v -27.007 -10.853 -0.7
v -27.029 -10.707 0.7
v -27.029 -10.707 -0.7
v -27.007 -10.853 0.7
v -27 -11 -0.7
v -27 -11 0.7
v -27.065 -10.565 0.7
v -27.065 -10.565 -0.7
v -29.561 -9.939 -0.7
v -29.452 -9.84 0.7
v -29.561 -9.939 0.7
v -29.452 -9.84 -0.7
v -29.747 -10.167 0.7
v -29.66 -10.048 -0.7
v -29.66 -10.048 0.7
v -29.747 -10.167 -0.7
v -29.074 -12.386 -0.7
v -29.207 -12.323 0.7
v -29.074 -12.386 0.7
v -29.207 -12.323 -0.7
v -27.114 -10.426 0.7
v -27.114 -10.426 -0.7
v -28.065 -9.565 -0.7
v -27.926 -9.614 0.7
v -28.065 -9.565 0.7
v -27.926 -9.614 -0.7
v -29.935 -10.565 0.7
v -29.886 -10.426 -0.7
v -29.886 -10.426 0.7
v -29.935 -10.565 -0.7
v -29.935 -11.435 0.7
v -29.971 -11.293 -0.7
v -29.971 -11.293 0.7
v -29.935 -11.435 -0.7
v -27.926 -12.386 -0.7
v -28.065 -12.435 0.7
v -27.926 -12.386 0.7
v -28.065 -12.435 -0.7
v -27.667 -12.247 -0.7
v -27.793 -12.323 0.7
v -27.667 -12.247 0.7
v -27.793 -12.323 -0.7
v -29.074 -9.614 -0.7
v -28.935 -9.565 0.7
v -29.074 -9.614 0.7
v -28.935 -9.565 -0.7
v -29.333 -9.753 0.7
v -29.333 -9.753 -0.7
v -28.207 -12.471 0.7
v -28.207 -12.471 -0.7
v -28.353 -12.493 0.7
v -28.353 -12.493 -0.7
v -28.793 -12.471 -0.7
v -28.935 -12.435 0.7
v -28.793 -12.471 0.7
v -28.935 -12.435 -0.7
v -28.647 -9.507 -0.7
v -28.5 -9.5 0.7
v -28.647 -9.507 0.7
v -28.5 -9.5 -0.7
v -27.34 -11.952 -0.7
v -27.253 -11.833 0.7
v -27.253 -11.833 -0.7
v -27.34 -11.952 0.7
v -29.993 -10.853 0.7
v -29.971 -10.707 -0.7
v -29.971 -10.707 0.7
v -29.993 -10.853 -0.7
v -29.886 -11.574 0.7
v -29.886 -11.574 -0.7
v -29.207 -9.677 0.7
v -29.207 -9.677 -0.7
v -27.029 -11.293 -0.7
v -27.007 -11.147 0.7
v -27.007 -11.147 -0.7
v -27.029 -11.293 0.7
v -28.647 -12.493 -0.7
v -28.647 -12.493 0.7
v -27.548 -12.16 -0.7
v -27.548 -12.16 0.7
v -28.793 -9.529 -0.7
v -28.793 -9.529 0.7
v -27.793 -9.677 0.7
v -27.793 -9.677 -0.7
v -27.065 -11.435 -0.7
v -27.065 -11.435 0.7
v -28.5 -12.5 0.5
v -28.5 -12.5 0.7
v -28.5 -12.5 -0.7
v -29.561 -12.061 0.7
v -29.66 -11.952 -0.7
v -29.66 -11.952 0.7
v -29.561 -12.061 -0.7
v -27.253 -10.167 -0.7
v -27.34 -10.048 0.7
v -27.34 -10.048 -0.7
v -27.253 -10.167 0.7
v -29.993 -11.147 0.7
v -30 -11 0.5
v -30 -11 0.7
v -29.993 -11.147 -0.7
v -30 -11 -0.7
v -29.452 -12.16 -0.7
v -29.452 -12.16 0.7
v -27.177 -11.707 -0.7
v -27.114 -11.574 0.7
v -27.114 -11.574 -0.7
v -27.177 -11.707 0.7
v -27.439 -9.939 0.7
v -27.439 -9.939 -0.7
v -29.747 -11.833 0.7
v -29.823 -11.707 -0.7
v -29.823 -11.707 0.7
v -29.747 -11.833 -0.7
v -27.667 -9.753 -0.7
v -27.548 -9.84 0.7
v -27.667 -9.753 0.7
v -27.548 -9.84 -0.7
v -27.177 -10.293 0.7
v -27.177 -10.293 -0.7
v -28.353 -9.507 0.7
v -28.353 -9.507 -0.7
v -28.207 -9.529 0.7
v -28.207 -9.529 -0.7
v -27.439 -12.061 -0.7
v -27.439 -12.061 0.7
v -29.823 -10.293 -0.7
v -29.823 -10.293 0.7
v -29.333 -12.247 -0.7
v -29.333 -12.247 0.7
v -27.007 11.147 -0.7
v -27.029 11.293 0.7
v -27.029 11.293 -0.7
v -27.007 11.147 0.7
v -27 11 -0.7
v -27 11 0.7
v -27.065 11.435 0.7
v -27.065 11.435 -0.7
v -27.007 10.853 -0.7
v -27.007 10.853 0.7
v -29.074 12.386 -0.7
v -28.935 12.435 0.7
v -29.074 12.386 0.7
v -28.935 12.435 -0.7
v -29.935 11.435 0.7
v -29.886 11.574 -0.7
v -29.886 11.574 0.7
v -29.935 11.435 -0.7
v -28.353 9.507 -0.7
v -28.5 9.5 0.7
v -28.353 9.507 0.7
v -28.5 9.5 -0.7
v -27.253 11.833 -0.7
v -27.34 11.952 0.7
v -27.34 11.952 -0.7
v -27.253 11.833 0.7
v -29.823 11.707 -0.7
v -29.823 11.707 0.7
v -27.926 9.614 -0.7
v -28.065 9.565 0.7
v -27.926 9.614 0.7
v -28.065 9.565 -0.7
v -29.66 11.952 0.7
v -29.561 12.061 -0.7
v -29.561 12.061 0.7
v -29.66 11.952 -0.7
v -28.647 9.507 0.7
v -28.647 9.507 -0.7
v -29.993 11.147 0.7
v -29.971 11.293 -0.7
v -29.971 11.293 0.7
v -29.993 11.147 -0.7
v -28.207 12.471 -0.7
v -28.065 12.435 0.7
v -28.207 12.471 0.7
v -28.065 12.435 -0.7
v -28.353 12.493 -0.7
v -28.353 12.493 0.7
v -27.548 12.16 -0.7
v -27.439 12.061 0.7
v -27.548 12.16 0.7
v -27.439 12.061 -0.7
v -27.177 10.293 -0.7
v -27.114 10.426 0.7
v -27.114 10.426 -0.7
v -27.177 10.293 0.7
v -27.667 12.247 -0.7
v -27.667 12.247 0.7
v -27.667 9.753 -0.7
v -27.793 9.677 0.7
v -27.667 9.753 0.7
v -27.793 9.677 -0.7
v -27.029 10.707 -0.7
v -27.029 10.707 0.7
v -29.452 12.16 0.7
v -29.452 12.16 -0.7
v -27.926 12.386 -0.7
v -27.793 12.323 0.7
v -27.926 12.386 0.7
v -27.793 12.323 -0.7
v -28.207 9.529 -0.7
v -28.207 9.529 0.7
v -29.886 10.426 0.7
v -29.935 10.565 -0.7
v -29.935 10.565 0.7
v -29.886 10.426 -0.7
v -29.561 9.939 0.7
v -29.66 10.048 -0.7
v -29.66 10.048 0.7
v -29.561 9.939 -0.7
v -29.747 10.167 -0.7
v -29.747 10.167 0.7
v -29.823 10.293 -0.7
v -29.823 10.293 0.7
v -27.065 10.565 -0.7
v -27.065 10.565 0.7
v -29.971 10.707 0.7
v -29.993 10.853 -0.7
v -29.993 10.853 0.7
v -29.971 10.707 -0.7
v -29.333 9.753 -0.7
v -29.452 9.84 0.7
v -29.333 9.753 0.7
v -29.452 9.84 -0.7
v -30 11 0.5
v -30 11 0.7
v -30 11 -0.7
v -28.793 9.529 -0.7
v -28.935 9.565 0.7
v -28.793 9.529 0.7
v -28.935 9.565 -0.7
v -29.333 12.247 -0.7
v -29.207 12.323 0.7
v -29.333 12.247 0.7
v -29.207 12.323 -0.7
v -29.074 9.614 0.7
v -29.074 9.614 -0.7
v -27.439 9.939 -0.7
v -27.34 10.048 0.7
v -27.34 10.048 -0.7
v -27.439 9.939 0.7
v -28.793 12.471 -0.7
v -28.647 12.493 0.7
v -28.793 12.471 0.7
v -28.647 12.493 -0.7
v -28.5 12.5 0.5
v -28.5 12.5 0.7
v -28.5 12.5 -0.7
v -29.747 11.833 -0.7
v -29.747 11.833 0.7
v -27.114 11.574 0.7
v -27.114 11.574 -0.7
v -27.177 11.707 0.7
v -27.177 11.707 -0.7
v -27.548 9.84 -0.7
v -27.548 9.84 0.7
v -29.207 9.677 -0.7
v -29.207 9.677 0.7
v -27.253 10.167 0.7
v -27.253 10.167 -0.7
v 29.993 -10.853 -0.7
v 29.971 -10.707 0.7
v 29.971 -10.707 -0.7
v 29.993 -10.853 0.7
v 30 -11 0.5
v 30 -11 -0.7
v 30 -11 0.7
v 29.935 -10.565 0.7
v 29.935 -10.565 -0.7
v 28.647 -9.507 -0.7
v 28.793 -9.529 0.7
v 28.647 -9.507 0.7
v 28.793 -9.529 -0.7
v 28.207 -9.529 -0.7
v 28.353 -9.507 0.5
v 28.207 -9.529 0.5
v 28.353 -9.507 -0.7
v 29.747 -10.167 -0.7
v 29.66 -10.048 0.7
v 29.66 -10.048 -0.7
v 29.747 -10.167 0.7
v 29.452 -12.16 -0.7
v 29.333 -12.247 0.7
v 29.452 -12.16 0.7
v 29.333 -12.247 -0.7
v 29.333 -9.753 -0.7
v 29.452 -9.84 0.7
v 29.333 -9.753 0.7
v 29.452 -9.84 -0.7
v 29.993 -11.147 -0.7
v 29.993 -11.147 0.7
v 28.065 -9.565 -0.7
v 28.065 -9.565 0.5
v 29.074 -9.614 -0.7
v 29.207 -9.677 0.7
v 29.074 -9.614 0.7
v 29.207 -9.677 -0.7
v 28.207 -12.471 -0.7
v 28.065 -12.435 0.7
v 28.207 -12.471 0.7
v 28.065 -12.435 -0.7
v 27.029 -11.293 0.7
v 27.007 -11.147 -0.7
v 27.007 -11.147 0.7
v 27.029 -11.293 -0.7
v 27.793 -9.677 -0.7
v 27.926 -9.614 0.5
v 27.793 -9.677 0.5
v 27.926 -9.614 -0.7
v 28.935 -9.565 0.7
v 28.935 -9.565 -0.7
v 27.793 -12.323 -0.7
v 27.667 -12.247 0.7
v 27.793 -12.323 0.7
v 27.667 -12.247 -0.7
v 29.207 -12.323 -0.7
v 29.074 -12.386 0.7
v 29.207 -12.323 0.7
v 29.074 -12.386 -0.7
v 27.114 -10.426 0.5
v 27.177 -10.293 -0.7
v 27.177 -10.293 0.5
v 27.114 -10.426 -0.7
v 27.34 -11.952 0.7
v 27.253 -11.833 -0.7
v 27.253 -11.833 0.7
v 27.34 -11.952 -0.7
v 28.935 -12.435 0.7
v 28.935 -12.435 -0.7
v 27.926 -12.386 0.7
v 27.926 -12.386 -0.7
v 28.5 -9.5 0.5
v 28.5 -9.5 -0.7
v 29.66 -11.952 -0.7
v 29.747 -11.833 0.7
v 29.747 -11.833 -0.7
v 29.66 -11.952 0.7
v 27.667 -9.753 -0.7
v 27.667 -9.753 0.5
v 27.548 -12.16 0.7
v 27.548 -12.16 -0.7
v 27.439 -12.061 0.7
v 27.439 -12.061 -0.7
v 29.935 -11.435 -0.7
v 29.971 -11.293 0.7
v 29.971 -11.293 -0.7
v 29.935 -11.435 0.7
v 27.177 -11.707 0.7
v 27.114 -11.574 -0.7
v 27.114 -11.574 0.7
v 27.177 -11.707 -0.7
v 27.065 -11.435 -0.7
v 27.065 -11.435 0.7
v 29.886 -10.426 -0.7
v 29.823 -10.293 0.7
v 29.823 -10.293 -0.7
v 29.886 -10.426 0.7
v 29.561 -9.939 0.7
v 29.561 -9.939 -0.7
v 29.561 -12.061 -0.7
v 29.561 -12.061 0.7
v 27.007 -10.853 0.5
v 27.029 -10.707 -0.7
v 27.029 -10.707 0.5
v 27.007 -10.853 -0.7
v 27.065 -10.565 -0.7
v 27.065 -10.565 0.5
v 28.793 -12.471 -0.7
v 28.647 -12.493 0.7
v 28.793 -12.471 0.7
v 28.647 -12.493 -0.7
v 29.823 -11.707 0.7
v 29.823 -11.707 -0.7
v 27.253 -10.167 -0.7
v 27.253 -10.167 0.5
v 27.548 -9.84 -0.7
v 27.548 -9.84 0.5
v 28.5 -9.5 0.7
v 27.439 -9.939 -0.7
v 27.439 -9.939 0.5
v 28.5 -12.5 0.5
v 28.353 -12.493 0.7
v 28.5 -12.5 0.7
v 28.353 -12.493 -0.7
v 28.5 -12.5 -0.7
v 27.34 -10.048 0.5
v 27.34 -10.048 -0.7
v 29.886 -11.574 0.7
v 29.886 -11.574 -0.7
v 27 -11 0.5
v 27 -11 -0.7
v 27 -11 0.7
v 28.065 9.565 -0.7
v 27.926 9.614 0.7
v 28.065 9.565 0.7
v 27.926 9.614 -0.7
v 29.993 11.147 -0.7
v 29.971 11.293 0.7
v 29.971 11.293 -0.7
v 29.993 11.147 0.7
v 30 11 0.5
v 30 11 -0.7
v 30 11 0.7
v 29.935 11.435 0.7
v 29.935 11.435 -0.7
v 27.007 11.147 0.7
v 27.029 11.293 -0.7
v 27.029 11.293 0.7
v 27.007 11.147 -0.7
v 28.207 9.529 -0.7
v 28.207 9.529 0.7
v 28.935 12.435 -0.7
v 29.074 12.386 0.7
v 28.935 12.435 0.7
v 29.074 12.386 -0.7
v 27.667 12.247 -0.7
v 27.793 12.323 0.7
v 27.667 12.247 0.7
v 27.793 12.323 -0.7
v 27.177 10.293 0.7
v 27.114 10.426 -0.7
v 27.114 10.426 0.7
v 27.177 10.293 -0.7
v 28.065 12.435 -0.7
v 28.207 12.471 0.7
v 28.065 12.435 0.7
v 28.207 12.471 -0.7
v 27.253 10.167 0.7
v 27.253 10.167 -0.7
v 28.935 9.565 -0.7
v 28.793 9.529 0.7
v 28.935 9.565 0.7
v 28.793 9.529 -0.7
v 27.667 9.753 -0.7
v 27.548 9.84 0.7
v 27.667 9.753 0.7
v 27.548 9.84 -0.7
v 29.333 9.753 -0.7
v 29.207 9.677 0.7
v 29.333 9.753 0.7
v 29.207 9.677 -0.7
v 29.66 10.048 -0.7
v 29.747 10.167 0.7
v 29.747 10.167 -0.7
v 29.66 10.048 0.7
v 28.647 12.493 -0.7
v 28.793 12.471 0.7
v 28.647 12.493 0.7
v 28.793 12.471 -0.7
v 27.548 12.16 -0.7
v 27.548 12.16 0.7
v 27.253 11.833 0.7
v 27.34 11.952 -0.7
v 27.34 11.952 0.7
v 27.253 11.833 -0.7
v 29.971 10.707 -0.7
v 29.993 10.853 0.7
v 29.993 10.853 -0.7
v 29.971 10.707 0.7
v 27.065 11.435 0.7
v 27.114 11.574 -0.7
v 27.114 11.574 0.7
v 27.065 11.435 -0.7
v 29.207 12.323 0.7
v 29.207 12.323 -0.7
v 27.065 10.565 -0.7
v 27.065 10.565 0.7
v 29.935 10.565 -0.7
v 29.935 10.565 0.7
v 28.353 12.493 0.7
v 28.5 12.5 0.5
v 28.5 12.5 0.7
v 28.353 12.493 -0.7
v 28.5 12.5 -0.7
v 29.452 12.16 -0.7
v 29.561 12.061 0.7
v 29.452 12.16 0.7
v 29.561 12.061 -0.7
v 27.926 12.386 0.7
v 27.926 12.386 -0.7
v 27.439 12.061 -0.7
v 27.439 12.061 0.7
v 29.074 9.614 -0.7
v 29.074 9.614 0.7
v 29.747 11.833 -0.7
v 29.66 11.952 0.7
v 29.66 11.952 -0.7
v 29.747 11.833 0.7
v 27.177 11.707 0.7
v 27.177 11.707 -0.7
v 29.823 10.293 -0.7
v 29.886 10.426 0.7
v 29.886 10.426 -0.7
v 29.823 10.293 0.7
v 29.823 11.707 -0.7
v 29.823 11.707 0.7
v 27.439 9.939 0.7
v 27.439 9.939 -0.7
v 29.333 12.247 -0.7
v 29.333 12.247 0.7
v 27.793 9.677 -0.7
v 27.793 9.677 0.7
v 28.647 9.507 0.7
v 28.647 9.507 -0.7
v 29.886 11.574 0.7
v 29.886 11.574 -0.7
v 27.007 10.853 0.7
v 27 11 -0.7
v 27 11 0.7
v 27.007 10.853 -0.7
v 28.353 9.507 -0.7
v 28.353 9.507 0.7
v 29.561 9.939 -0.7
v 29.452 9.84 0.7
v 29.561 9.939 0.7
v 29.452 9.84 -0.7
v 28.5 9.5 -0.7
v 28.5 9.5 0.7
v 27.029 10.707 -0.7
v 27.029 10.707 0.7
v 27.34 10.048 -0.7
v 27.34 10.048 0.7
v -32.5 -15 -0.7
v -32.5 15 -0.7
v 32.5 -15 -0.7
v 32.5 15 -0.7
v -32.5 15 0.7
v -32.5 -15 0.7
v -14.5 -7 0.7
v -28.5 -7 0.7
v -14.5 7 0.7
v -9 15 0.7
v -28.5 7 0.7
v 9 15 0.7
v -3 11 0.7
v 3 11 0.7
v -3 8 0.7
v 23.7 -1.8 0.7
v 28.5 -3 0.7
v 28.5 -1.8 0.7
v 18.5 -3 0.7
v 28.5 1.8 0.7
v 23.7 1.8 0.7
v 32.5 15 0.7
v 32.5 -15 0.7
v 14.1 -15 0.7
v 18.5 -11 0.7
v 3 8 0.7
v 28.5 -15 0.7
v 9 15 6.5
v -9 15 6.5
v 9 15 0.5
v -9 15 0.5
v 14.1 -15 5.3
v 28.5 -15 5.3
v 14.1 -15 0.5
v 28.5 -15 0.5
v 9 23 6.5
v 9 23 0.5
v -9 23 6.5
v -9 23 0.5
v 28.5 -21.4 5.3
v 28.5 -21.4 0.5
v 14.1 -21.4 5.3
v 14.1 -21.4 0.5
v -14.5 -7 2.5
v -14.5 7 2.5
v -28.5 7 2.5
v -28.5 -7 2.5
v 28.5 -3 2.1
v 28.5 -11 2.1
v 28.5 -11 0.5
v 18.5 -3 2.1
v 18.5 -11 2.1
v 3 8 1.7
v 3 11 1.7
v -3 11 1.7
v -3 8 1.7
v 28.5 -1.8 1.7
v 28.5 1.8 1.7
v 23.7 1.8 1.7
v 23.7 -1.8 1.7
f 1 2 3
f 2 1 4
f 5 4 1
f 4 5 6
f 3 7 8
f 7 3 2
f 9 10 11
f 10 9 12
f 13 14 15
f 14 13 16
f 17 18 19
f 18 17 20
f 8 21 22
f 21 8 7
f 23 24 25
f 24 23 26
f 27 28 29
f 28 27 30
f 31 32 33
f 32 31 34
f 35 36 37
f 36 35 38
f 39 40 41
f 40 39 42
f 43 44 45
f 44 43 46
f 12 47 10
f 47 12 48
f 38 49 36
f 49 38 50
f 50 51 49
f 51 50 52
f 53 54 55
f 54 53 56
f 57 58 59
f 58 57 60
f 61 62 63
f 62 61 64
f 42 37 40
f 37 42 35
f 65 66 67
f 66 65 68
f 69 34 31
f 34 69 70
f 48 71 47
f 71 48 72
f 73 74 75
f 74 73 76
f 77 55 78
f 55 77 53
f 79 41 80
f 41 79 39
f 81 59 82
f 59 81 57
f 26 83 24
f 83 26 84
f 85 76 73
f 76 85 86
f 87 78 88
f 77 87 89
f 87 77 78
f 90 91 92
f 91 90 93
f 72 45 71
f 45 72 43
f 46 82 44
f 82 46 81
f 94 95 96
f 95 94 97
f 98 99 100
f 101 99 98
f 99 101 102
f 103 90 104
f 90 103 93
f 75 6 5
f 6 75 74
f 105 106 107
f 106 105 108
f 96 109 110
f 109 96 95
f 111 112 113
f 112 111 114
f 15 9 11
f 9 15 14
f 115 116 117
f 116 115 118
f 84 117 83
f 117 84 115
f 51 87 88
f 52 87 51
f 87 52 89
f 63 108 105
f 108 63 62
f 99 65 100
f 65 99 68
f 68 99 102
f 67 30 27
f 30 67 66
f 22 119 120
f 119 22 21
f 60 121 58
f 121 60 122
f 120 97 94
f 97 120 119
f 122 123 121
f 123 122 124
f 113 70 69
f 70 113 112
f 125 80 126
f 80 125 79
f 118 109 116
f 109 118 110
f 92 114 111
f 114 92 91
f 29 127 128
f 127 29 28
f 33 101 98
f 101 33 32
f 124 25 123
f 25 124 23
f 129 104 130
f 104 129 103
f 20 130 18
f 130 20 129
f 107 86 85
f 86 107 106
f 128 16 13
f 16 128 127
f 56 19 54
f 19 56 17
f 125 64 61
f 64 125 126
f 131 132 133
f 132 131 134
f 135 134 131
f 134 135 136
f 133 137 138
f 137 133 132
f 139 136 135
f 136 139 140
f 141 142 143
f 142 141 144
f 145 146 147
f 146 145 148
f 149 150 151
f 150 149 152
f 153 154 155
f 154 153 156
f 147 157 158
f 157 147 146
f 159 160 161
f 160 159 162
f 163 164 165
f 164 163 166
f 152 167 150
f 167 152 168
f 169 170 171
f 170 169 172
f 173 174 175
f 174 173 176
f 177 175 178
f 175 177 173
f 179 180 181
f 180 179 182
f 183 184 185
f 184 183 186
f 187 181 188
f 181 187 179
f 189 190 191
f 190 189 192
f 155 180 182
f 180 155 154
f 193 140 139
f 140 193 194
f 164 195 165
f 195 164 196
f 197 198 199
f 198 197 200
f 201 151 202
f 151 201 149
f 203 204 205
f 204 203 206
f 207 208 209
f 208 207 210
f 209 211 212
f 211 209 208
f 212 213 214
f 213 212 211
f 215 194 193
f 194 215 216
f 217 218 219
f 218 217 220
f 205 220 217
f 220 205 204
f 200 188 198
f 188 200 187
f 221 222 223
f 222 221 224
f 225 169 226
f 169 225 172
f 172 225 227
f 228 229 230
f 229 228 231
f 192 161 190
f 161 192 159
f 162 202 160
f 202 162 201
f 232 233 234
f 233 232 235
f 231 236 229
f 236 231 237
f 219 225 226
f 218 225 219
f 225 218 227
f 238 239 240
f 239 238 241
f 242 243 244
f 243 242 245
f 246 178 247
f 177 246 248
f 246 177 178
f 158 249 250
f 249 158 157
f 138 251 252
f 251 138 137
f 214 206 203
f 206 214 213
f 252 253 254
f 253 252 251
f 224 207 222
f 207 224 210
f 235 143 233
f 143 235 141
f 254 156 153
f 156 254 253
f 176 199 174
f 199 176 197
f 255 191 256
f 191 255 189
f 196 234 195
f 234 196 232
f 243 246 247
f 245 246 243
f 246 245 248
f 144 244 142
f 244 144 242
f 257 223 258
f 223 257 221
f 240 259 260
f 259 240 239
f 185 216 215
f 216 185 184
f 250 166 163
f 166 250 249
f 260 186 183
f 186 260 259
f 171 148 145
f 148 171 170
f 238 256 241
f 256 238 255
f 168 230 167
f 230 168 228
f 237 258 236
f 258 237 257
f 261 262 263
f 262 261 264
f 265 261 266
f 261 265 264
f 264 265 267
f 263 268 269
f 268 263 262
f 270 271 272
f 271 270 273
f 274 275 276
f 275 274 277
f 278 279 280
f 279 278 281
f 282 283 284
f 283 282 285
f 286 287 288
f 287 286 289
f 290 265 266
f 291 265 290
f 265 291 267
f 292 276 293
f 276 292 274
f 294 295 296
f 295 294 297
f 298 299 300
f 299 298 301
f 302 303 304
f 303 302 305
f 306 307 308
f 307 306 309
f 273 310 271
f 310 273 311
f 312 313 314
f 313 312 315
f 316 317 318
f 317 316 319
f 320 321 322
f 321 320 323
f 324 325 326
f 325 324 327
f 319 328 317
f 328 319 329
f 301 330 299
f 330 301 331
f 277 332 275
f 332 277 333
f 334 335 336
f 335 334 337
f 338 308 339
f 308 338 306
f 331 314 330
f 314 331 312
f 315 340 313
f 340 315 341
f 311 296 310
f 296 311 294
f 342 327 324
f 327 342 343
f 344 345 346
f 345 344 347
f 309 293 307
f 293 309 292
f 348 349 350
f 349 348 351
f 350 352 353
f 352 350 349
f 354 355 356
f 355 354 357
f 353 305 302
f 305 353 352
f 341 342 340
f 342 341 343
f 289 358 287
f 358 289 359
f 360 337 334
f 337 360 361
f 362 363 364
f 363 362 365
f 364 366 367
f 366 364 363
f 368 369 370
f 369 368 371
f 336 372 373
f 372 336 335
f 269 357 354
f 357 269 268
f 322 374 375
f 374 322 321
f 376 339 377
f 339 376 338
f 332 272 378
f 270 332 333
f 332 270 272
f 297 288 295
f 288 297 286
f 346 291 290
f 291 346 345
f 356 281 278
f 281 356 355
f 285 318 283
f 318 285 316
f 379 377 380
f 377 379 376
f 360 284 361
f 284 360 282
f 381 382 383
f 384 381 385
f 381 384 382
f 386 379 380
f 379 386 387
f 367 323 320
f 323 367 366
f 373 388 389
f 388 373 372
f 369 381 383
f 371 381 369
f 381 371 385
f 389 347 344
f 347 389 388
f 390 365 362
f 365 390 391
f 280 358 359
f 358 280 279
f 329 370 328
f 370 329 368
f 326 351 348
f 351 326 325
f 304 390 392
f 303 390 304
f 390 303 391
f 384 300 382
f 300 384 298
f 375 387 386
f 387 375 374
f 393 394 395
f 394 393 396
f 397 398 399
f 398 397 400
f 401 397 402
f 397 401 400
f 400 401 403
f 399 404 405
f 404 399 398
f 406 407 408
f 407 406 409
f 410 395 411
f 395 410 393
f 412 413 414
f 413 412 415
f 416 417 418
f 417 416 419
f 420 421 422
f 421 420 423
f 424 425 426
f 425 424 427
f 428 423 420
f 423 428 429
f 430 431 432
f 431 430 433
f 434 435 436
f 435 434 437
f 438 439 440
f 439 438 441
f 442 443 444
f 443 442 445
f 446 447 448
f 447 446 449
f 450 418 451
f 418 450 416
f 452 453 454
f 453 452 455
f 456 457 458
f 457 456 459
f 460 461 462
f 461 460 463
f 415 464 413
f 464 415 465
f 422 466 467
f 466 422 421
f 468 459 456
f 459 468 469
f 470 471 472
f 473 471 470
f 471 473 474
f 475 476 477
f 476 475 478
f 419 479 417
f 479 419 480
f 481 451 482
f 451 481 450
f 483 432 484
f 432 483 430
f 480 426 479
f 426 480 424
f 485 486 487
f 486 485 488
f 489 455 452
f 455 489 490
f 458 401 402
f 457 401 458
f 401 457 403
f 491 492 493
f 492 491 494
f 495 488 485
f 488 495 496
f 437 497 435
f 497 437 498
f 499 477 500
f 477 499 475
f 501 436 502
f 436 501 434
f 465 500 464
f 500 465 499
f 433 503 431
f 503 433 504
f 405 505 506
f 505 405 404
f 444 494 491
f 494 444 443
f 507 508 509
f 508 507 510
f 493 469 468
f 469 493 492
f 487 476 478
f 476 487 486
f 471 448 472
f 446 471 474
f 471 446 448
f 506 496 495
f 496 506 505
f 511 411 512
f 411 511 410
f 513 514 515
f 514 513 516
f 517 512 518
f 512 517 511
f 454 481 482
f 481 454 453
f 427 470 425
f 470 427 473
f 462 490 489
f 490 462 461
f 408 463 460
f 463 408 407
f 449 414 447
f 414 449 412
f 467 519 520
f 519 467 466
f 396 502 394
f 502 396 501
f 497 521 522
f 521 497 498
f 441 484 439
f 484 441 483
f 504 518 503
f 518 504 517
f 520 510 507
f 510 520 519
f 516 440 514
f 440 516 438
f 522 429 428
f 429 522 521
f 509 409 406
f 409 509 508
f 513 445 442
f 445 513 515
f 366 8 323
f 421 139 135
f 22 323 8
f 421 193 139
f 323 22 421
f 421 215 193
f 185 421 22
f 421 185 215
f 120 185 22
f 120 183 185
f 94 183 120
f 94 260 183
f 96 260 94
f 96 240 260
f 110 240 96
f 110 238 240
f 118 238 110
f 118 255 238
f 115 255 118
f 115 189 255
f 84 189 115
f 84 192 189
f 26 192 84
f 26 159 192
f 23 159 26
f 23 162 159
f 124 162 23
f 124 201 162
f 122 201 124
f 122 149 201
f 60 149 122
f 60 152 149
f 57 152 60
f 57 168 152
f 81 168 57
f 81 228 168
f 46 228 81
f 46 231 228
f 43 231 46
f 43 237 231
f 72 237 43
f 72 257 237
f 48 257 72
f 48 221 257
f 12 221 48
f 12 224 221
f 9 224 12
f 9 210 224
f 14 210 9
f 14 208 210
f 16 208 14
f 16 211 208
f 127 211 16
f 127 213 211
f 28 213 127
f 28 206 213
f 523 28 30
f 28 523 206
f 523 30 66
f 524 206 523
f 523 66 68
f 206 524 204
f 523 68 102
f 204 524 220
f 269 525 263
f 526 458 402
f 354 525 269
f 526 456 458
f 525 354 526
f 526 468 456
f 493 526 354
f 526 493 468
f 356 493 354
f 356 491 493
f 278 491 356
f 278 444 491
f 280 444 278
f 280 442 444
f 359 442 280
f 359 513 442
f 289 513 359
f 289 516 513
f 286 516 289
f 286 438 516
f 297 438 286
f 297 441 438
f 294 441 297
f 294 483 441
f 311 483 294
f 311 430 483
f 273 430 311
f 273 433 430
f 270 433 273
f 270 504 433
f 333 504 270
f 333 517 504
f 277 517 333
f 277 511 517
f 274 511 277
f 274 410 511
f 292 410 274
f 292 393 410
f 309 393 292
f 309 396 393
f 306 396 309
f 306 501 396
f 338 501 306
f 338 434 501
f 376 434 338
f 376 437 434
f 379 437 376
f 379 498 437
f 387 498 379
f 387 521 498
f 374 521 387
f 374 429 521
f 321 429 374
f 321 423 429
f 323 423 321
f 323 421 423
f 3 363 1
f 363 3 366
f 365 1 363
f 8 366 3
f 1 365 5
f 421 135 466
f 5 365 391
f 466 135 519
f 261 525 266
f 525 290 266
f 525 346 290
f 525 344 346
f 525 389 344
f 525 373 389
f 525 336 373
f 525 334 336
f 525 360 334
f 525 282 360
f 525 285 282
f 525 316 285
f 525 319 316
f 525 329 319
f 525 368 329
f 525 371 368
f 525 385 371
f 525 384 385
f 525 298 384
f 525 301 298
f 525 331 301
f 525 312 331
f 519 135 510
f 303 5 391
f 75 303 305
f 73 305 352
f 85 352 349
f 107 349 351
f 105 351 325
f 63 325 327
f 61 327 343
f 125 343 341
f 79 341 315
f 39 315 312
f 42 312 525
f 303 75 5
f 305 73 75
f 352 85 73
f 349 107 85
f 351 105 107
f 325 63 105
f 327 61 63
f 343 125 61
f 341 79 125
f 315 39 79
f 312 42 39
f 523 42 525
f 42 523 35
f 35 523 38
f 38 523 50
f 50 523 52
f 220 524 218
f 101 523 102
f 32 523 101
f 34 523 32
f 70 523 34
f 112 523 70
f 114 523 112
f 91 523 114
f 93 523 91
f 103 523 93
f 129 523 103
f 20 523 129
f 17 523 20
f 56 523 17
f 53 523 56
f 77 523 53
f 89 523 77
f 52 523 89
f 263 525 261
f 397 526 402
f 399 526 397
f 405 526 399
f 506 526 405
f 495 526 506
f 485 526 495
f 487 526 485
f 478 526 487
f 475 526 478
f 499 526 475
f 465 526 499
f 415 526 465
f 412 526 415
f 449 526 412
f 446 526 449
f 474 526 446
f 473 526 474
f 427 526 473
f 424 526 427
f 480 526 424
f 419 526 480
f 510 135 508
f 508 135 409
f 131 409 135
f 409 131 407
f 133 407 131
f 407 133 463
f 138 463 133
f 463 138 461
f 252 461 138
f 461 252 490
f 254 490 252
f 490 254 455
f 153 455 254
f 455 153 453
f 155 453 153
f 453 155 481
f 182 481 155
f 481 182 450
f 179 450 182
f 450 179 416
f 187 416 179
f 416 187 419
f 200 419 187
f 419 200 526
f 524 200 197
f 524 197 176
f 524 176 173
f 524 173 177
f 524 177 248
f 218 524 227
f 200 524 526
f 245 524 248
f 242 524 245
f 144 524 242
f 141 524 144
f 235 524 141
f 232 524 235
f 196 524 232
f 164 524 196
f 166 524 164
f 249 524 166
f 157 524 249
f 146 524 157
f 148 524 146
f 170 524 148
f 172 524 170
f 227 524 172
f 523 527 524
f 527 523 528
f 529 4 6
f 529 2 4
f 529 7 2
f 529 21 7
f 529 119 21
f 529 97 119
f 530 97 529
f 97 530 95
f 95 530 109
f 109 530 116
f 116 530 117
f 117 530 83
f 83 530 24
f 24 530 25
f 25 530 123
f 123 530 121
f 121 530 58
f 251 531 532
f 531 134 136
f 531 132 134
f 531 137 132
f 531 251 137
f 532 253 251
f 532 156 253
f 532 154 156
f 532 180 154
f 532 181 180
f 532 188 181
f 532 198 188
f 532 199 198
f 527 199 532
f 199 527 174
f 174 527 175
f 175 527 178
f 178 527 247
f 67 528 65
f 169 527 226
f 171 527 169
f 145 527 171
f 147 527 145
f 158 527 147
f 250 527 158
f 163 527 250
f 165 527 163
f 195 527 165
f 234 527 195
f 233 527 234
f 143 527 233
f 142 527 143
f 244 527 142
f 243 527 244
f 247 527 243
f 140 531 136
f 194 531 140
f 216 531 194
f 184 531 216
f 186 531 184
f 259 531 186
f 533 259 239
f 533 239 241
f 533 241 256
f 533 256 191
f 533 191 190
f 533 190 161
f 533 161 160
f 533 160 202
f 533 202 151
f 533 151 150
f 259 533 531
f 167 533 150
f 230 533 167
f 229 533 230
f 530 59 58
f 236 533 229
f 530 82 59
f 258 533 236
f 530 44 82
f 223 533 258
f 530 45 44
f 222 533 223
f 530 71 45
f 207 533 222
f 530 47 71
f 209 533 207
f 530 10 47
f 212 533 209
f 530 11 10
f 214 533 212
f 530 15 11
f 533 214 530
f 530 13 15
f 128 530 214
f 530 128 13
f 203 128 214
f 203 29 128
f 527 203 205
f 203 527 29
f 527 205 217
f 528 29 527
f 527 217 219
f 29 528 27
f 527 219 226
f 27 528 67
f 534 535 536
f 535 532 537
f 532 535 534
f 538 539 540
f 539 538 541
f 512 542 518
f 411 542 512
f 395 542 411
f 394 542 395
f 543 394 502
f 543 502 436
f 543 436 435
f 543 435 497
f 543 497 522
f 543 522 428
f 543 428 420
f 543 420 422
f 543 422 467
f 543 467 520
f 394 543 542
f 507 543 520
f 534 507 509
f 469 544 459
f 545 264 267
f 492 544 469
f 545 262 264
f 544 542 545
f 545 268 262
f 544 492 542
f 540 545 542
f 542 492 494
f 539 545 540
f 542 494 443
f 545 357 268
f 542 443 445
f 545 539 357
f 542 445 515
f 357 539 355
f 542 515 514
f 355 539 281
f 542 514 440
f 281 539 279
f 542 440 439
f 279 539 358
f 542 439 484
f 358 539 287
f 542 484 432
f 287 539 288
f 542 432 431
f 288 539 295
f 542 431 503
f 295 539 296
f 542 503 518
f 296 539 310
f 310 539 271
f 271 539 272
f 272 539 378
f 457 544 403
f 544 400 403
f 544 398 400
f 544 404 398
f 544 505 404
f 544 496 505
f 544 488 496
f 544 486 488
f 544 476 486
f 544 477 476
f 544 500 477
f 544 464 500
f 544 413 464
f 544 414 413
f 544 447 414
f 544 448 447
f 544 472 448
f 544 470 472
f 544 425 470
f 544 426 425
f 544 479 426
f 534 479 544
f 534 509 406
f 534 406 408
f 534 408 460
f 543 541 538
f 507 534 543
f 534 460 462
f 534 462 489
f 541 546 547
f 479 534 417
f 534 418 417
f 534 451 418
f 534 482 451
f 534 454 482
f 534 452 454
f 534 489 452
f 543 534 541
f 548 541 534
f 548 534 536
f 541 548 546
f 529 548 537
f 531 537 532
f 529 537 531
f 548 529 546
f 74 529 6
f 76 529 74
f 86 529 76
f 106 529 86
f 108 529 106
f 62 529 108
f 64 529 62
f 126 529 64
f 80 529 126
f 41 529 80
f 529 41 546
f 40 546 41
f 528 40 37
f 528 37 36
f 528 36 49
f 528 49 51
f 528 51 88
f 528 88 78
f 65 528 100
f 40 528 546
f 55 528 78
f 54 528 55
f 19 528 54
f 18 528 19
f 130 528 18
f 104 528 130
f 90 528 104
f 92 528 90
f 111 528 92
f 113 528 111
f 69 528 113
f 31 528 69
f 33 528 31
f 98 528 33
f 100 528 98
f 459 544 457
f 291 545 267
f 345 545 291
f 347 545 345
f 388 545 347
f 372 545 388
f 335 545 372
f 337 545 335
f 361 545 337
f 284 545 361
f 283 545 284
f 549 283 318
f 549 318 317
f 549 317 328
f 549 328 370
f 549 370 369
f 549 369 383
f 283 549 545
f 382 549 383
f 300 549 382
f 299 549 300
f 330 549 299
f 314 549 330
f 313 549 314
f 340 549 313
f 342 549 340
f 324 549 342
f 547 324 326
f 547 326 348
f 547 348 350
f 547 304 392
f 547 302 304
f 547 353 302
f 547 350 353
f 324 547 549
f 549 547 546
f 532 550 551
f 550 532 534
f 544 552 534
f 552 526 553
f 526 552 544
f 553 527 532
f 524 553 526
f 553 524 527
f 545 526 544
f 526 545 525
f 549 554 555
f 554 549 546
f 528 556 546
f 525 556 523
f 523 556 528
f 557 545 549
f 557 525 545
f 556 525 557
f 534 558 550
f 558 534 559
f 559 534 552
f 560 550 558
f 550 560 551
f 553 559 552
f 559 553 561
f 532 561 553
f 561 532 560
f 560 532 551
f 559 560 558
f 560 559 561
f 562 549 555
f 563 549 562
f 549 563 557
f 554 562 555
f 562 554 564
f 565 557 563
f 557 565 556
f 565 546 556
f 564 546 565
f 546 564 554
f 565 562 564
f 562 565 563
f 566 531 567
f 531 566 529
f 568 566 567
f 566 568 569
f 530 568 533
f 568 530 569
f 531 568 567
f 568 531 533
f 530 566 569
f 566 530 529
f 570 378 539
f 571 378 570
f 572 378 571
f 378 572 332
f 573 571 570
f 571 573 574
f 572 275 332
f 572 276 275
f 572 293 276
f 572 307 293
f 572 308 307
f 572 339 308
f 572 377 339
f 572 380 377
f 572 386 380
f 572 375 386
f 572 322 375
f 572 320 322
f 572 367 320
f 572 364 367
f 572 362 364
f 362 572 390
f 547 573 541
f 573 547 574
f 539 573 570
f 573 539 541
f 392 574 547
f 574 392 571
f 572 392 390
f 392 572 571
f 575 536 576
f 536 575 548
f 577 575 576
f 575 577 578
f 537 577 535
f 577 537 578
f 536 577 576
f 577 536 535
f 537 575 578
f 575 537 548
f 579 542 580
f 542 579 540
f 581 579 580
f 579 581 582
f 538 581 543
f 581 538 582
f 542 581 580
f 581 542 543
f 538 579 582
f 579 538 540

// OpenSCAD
$fn = 64;

// Target SBC envelope (exact)
pcb_length = 65.0;
pcb_width  = 30.0;
pcb_thickness = 1.4;

// Keep outline simple rectangular to match 65x30 footprint intent
corner_radius = 0.0;          // set >0 if you explicitly want rounded corners
mount_hole_diameter = 3.0;
mount_hole_edge_offset = 4.0;
hole_cut_extra = 0.6;

// Components (kept, but forced to be physically connected to PCB with overlap)
connector_height = 6.0;
connector_depth  = 8.0;
connector_length = 18.0;

chip1_length = 14.0;
chip1_width  = 14.0;
chip1_height = 2.0;

chip2_length = 10.0;
chip2_width  = 8.0;
chip2_height = 1.6;

component_height = 1.2;
component_length = 6.0;
component_width  = 3.0;

silkscreen_thickness = 0.2;
silkscreen_line_width = 1.0;
silkscreen_margin = 2.0;

// Small overlap to guarantee one connected solid (no floating parts)
z_overlap = 0.2;   // mm

module pcb_outline_2d() {
    // Exact 65x30 rectangle (optionally rounded if corner_radius > 0)
    if (corner_radius <= 0)
        square([pcb_length, pcb_width], center=true);
    else
        offset(r=corner_radius)
            square([pcb_length - 2*corner_radius, pcb_width - 2*corner_radius], center=true);
}

module pcb_main_body() {
    color([0.0, 0.4, 0.2])
    difference() {
        linear_extrude(height=pcb_thickness, center=true)
            pcb_outline_2d();

        // Mounting holes (through)
        for (sx = [-1, 1], sy = [-1, 1])
            translate([sx*(pcb_length/2 - mount_hole_edge_offset),
                       sy*(pcb_width/2  - mount_hole_edge_offset),
                       0])
                cylinder(h=pcb_thickness + hole_cut_extra, r=mount_hole_diameter/2, center=true);
    }
}

module edge_connectors() {
    color([0.1, 0.1, 0.6])
    union() {
        // Top edge connector (positive Y), connected by z_overlap into PCB
        translate([0,
                   pcb_width/2 + connector_depth/2,
                   pcb_thickness/2 + connector_height/2 - z_overlap])
            cube([connector_length, connector_depth, connector_height], center=true);

        // Bottom edge connector (negative Y), slightly smaller, connected by z_overlap
        translate([pcb_length/2 - mount_hole_edge_offset - (connector_length*0.8)/2,
                   -pcb_width/2 - (connector_depth*0.8)/2,
                   pcb_thickness/2 + (connector_height*0.8)/2 - z_overlap])
            cube([connector_length*0.8, connector_depth*0.8, connector_height*0.8], center=true);
    }
}

module chips_components() {
    color([0.4, 0.4, 0.43])
    union() {
        // Chip 1
        translate([-pcb_length/2 + mount_hole_edge_offset + chip1_length/2,
                   0,
                   pcb_thickness/2 + chip1_height/2 - z_overlap])
            cube([chip1_length, chip1_width, chip1_height], center=true);

        // Chip 2
        translate([pcb_length/2 - mount_hole_edge_offset - chip2_length/2,
                   -pcb_width/2 + mount_hole_edge_offset + chip2_width/2,
                   pcb_thickness/2 + chip2_height/2 - z_overlap])
            cube([chip2_length, chip2_width, chip2_height], center=true);

        // Small component near top edge
        translate([0,
                   pcb_width/2 - mount_hole_edge_offset - component_width/2,
                   pcb_thickness/2 + component_height/2 - z_overlap])
            cube([component_length, component_width, component_height], center=true);

        // Side component near right edge
        translate([pcb_length/2 - mount_hole_edge_offset - (component_length*0.8)/2,
                   0,
                   pcb_thickness/2 + component_height/2 - z_overlap])
            cube([component_length*0.8, component_width*1.2, component_height], center=true);
    }
}

module silkscreen_markings() {
    color([0.85, 0.85, 0.8])
    union() {
        // Place silkscreen slightly embedded so it unions (single solid)
        z = pcb_thickness/2 + silkscreen_thickness/2 - z_overlap;

        translate([0, pcb_width/2 - silkscreen_margin, z])
            cube([pcb_length - 2*silkscreen_margin, silkscreen_line_width, silkscreen_thickness], center=true);

        translate([0, -pcb_width/2 + silkscreen_margin, z])
            cube([pcb_length - 2*silkscreen_margin, silkscreen_line_width, silkscreen_thickness], center=true);

        translate([-pcb_length/2 + silkscreen_margin, 0, z])
            cube([silkscreen_line_width, pcb_width - 2*silkscreen_margin, silkscreen_thickness], center=true);

        translate([pcb_length/2 - silkscreen_margin, 0, z])
            cube([silkscreen_line_width, pcb_width - 2*silkscreen_margin, silkscreen_thickness], center=true);
    }
}

module sbc_complete_model() {
    // One connected solid: all parts overlap into PCB by z_overlap
    union() {
        pcb_main_body();
        edge_connectors();
        chips_components();
        silkscreen_markings();
    }
}

sbc_complete_model();
